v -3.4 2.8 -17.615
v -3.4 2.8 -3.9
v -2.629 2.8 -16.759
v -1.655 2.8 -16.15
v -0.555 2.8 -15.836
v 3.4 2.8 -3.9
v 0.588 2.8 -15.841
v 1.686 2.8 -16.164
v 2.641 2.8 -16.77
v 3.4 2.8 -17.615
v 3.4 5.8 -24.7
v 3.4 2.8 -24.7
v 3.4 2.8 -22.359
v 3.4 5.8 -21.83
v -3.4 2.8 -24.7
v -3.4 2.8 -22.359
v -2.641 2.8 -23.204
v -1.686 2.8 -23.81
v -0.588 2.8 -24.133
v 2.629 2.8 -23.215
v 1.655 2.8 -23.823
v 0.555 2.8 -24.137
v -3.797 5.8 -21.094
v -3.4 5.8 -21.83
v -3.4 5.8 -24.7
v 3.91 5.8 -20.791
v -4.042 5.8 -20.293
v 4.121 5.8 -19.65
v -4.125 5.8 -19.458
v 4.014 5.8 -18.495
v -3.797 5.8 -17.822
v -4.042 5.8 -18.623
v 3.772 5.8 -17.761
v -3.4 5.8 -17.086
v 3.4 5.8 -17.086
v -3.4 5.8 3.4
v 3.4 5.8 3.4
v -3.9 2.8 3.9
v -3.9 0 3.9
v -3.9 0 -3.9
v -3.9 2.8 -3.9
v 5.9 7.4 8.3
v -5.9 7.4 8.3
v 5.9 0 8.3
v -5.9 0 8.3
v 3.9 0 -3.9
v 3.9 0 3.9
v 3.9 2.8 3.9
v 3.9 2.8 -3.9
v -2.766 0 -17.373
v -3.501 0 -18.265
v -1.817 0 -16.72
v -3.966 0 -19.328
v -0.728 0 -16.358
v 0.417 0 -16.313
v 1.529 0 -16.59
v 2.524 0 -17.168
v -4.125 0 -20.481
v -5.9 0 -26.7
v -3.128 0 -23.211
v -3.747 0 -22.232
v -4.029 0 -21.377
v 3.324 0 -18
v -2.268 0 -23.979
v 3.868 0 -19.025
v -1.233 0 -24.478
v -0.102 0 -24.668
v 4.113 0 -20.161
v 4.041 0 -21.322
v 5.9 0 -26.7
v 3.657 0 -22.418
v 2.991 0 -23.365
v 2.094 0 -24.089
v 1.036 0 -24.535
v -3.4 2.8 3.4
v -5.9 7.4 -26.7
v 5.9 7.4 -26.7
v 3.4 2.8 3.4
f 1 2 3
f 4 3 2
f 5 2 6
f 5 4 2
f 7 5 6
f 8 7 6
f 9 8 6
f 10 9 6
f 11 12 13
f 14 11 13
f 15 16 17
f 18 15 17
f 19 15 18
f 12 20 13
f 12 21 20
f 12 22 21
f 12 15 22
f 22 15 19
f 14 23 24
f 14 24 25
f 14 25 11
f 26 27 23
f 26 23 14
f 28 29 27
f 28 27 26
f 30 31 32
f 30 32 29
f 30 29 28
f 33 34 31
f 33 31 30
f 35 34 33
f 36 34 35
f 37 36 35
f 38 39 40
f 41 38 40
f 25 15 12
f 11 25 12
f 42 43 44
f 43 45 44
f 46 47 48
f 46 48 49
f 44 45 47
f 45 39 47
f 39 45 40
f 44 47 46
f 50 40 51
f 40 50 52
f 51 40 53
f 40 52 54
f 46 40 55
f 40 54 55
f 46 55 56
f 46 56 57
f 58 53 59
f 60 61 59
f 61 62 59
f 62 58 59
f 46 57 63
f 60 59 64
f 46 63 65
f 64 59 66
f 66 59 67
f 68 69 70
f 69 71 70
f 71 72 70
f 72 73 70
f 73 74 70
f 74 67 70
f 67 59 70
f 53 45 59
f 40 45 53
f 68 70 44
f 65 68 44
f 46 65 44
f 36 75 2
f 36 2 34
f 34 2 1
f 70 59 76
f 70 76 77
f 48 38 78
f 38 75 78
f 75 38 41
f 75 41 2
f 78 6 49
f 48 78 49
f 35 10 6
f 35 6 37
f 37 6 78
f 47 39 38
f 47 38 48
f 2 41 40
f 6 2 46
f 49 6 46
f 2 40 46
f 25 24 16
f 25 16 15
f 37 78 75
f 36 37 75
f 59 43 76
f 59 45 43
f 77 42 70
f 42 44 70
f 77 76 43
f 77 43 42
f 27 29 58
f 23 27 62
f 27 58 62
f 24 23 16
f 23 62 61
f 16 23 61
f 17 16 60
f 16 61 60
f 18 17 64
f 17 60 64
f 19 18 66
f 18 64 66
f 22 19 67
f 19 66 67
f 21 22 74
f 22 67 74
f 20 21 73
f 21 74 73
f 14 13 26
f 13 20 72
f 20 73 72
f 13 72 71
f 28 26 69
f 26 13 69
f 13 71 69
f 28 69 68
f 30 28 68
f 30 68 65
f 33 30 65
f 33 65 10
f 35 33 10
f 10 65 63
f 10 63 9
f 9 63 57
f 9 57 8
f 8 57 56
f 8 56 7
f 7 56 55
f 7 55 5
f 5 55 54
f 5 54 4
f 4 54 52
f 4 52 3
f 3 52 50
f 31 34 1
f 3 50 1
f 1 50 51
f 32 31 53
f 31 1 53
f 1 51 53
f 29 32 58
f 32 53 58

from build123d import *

# Parameters (mm, degrees)
SKETCH1_W           = 11.8
SKETCH1_H           = 35
SKETCH1_W_2         = 7.8
SKETCH1_H_2         = 7.8
BOSS_EXTRUDE1_DEPTH = 2.8
SKETCH2_W           = 11.8
SKETCH2_H           = 35
BOSS_EXTRUDE2_DEPTH = 3
SKETCH3_W           = 11.8
SKETCH3_H           = 35
BOSS_EXTRUDE3_DEPTH = 1.6
CUT_EXTRUDE1_REACH  = 15.365
SKETCH4_R           = 4.125


with BuildPart() as part:
    # Sketch1 → Boss-Extrude1 (new body)
    with BuildSketch(Plane(origin=(0, 0, 0), x_dir=(1, 0, 0), z_dir=(0, 1, 0))):
        with Locations((0, 9.2)):
            Rectangle(SKETCH1_W, SKETCH1_H)
        Rectangle(SKETCH1_W_2, SKETCH1_H_2, mode=Mode.SUBTRACT)
    extrude(amount=BOSS_EXTRUDE1_DEPTH)

    # Sketch2 → Boss-Extrude2 (add)
    with BuildSketch(Plane(origin=(0, 2.8, 0), x_dir=(1, 0, 0), z_dir=(0, 1, 0))):
        with Locations((0, 9.2)):
            Rectangle(SKETCH2_W, SKETCH2_H)
        Polygon((-3.9, 3.9), (-3.4, 3.9), (-3.4, 24.7), (3.4, 24.7), (3.4, 3.9), (3.9, 3.9), (3.9, -3.9), (-3.9, -3.9), align=None, mode=Mode.SUBTRACT)
        Polygon((3.4, -3.4), (-3.4, -3.4), (-3.4, 3.4), (-3.4, 3.9), (-3.9, 3.9), (-3.9, -3.9), (3.9, -3.9), (3.9, 3.9), (3.4, 3.9), (3.4, 3.4), align=None)
    extrude(amount=BOSS_EXTRUDE2_DEPTH)

    # Sketch3 → Boss-Extrude3 (add)
    with BuildSketch(Plane(origin=(0, 5.8, 0), x_dir=(1, 0, 0), z_dir=(0, 1, 0))):
        with Locations((0, 9.2)):
            Rectangle(SKETCH3_W, SKETCH3_H)
    extrude(amount=BOSS_EXTRUDE3_DEPTH)

    # Cut-Extrude1: up to this face of the body (flat: up to its plane)
    cut_extrude1_end = Plane(part.part.faces().sort_by_distance((0, 5.8, -10.65))[0])
    # Sketch4 → Cut-Extrude1 (cut, up to the picked face)
    with BuildSketch(Plane(origin=(0, -4.565968913, -0.805103513), x_dir=(-1, 0, 0), z_dir=(0, -0.984807753, -0.173648178)), mode=Mode.PRIVATE) as cut_extrude1_sk1:
        with Locations((0, 20.169367005)):
            Circle(SKETCH4_R)
    cut_extrude1_tool1 = split(extrude(cut_extrude1_sk1.sketch, amount=-CUT_EXTRUDE1_REACH, mode=Mode.PRIVATE), bisect_by=cut_extrude1_end, keep=Keep.BOTH, mode=Mode.PRIVATE)
    add(cut_extrude1_tool1.solids().sort_by_distance((0, -1.063595, -20.668053))[0], mode=Mode.SUBTRACT)


solid = part.part
